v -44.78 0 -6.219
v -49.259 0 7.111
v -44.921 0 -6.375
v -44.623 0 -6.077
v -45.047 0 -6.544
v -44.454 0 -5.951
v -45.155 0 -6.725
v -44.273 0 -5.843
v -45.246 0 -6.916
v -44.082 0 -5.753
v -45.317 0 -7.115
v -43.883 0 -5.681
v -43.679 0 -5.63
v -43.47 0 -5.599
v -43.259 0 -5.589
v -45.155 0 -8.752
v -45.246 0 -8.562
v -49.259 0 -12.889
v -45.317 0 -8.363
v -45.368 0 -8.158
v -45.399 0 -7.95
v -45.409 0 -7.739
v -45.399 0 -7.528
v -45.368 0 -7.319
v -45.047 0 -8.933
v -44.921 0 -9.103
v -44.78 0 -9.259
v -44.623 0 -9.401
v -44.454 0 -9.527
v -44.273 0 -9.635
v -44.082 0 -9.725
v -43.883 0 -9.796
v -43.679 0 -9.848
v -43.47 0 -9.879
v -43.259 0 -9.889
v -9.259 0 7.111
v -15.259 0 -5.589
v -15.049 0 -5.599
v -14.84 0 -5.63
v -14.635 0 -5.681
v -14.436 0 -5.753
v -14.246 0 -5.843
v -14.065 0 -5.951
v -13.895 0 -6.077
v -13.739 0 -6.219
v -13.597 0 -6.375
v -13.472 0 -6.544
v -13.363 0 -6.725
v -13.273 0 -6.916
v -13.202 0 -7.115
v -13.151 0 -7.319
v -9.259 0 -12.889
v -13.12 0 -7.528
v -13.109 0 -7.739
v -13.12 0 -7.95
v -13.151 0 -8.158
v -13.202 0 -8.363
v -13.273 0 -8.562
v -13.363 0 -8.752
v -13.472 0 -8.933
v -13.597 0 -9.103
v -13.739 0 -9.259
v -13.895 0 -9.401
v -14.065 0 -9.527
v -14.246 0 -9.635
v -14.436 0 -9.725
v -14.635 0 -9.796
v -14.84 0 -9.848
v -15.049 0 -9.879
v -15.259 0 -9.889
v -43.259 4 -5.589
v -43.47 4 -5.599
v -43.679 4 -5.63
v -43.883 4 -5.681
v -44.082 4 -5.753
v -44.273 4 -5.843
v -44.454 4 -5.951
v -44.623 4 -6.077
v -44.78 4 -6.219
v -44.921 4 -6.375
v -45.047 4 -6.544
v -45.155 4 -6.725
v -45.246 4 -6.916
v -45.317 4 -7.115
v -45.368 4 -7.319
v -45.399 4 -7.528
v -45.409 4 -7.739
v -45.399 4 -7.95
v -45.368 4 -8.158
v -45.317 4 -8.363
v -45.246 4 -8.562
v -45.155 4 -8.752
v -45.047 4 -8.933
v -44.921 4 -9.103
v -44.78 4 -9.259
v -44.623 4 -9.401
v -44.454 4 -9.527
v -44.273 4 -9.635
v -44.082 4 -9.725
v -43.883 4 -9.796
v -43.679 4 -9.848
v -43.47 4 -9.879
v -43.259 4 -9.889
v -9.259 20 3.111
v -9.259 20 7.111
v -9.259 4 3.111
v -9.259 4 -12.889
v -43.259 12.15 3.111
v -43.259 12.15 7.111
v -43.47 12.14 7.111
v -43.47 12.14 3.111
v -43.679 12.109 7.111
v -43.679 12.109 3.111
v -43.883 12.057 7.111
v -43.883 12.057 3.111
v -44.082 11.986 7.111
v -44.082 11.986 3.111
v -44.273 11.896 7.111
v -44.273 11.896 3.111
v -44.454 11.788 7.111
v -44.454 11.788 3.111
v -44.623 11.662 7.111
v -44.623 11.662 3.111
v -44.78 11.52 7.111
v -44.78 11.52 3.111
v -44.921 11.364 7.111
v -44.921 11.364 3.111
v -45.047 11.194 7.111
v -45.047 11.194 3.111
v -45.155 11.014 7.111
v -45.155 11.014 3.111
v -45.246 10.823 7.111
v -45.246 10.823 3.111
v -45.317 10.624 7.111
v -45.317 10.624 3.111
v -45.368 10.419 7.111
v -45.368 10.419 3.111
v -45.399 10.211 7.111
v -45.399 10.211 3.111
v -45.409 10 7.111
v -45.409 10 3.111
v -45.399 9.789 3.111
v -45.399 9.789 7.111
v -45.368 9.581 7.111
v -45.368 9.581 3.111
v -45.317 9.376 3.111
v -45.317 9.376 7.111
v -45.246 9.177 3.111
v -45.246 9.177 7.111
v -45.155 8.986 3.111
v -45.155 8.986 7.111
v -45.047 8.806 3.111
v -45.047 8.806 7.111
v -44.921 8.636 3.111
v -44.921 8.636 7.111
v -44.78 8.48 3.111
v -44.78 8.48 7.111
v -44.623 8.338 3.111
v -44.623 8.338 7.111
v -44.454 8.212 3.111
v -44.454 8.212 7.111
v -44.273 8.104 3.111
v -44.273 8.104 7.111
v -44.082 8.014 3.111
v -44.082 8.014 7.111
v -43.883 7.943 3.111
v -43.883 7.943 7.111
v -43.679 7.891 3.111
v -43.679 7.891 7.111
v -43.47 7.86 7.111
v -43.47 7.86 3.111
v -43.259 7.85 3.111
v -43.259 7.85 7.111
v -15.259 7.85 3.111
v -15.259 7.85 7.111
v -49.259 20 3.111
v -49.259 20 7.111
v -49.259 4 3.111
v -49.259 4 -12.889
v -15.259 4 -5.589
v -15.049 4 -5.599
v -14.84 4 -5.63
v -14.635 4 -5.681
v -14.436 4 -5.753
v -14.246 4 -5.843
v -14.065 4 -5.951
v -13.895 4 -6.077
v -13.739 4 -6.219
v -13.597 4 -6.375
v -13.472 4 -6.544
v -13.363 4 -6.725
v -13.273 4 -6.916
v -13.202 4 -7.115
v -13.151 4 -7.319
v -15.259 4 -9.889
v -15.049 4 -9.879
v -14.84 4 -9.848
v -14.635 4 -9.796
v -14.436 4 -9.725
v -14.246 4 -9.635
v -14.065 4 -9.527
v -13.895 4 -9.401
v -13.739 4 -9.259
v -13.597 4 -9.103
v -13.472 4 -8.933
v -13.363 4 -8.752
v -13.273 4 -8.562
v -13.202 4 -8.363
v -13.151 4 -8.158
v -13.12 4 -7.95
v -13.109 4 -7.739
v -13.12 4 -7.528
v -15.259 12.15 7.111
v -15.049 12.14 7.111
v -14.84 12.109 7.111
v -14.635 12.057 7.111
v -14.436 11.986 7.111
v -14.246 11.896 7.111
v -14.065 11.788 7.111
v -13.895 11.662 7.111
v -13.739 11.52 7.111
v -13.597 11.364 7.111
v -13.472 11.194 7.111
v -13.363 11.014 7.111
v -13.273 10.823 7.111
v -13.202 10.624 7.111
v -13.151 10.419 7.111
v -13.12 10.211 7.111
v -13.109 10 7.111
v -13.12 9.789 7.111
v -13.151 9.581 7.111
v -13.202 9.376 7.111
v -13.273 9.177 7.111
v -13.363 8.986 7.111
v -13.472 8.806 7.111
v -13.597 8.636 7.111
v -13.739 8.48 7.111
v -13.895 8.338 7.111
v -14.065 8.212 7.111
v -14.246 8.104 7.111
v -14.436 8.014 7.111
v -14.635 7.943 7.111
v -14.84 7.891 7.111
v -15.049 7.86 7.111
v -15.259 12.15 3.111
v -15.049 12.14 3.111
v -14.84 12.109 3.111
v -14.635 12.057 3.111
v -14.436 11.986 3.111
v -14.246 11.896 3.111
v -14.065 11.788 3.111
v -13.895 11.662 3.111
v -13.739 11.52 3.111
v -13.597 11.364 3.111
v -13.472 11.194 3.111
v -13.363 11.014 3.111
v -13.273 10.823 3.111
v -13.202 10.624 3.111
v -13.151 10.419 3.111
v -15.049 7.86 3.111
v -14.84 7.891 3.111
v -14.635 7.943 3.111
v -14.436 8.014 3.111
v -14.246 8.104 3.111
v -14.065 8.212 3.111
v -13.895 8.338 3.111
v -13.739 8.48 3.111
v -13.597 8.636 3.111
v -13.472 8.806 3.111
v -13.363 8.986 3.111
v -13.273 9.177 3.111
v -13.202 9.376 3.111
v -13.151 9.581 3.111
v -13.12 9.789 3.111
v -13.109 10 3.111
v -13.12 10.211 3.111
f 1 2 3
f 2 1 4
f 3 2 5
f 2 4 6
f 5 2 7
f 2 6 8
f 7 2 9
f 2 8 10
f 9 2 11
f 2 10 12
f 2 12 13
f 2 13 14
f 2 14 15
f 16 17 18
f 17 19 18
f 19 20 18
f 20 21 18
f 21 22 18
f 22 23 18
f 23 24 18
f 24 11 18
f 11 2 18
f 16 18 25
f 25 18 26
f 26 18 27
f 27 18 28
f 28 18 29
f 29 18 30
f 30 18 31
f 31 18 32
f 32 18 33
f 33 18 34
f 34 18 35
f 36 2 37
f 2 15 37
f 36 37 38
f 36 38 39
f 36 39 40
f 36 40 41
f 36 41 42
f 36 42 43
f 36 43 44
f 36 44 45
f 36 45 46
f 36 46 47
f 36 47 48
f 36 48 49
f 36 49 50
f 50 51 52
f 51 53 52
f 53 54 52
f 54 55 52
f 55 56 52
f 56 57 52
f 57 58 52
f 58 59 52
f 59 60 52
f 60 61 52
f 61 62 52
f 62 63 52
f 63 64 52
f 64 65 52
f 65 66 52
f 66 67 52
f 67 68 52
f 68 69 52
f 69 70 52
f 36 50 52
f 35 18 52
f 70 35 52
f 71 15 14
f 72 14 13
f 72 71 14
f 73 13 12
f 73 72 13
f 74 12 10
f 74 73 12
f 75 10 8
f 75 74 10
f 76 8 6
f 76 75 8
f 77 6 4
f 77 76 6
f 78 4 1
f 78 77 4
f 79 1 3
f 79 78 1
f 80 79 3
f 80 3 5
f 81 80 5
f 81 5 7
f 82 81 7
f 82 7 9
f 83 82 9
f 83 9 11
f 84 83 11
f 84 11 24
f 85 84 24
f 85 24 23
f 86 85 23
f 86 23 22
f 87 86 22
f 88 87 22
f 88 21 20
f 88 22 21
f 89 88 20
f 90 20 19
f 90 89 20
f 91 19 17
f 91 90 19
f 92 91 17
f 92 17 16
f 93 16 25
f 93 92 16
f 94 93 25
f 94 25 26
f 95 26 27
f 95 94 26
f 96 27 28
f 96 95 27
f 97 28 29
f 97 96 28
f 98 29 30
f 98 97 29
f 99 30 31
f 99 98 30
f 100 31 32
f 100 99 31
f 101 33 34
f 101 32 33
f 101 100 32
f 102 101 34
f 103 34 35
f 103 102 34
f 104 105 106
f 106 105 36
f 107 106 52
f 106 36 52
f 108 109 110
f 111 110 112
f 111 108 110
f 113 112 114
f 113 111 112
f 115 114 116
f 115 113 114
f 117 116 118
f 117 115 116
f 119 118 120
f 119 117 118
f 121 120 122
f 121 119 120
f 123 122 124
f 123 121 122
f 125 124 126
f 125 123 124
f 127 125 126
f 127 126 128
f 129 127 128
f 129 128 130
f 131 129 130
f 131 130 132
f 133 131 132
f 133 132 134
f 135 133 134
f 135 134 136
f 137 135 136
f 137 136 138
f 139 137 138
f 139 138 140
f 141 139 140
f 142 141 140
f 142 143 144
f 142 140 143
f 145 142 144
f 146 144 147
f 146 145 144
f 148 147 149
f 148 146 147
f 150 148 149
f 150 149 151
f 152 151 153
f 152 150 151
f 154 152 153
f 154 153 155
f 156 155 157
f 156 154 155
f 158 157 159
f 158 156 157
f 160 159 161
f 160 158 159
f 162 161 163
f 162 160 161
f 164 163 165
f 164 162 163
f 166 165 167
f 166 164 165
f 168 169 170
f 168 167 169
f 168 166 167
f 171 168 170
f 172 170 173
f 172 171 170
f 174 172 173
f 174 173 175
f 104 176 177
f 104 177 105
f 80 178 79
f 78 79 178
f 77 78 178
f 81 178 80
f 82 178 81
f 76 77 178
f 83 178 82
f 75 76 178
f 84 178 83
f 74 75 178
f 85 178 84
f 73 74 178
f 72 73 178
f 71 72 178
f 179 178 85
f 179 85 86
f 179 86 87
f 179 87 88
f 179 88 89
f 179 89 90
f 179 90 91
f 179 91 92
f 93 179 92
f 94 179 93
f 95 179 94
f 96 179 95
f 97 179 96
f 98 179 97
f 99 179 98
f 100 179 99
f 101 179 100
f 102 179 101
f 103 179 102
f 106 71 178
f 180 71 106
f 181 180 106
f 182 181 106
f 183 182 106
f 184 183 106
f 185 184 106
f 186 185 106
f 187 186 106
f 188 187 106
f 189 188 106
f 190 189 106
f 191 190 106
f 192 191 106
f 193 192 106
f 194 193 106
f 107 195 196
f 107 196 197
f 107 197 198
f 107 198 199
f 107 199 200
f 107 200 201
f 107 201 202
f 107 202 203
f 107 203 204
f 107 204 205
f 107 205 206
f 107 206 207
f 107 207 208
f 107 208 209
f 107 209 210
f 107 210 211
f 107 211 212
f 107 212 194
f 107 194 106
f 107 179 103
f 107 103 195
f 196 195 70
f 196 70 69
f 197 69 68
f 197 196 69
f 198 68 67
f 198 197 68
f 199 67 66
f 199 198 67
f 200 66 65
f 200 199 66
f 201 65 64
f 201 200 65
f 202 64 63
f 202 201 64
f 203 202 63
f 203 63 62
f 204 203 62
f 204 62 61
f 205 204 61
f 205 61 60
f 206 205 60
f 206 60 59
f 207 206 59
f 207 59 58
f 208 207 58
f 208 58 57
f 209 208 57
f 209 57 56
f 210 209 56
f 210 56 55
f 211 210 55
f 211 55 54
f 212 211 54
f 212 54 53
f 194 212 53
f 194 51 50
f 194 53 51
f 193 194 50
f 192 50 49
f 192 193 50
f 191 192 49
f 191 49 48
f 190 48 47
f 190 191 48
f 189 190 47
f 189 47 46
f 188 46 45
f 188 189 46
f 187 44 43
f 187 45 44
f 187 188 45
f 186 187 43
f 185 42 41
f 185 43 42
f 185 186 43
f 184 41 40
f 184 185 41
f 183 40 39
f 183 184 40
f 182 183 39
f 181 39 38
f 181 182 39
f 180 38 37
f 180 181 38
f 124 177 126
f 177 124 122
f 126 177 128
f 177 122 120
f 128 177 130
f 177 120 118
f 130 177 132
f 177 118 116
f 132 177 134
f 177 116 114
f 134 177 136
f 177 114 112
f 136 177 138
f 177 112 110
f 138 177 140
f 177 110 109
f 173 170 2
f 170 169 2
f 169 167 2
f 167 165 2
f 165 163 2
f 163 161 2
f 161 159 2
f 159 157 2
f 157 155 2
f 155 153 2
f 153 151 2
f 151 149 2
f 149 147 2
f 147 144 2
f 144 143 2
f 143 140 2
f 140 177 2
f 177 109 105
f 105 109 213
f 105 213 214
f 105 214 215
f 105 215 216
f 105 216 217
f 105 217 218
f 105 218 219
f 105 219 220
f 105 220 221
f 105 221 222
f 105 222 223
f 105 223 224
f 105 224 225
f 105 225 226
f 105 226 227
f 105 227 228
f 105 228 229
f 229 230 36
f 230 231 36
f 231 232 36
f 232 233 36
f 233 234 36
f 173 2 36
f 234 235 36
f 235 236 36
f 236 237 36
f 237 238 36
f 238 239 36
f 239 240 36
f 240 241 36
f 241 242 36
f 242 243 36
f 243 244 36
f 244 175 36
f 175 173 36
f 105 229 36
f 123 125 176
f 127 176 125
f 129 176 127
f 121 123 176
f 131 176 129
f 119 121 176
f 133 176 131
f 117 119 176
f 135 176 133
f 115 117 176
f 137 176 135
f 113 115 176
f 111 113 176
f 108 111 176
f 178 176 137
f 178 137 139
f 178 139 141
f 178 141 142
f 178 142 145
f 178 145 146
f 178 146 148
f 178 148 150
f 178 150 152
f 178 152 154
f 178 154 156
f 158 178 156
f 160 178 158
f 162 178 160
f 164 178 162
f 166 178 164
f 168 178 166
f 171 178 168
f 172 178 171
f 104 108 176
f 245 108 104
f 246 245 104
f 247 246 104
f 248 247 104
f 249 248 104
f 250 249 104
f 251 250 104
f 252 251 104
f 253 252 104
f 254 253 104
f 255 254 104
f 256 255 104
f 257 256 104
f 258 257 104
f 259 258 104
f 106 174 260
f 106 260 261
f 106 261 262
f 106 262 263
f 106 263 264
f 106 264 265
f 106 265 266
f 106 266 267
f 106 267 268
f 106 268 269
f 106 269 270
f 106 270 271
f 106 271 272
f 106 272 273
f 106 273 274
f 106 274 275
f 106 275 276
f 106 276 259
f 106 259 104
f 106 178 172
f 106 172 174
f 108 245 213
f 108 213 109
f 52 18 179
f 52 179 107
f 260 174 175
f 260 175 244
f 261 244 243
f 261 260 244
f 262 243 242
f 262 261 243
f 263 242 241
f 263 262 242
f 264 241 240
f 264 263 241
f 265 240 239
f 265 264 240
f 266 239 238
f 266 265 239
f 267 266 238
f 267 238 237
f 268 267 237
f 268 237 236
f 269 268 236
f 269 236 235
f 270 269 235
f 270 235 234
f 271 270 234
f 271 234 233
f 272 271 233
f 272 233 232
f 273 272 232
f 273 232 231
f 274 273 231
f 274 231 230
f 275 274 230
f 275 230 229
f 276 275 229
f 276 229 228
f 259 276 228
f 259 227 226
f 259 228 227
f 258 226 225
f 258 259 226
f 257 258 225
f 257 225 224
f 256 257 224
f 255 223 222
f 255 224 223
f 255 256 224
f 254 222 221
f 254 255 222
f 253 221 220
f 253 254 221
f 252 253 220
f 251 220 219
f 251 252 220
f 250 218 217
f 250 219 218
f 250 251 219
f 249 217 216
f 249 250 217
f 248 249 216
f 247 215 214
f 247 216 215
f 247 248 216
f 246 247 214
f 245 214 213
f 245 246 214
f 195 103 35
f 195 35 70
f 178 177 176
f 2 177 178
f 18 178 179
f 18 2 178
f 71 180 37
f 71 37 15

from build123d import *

# Parameters (mm, degrees)
SKETCH1_W           = 40
SKETCH1_H           = 20
BOSS_EXTRUDE1_DEPTH = 4
SKETCH5_W           = 40
SKETCH5_H           = 4
BOSS_EXTRUDE2_DEPTH = 16
CUT_EXTRUDE3_DEPTH  = 10
CUT_EXTRUDE5_DEPTH  = 10


with BuildPart() as part:
    # Sketch1 → Boss-Extrude1 (new body)
    with BuildSketch(Plane(origin=(0, 0, 0), x_dir=(1, 0, 0), z_dir=(0, 1, 0))):
        with Locations((-29.259259259, 2.888888889)):
            Rectangle(SKETCH1_W, SKETCH1_H)
    extrude(amount=BOSS_EXTRUDE1_DEPTH)

    # Sketch5 → Boss-Extrude2 (add)
    with BuildSketch(Plane(origin=(0, 4, 0), x_dir=(1, 0, 0), z_dir=(0, 1, 0))):
        with Locations((-29.259259259, -5.111111111)):
            Rectangle(SKETCH5_W, SKETCH5_H)
    extrude(amount=BOSS_EXTRUDE2_DEPTH)

    # Sketch7 → Cut-Extrude3 (cut)
    with BuildSketch(Plane(origin=(0, 4, 0), x_dir=(1, 0, 0), z_dir=(0, 1, 0))):
        with BuildLine():
            Line((-15.259259259, 5.588888889), (-43.259259259, 5.588888889))
            ThreePointArc((-43.259259259, 5.588888889), (-45.409259259, 7.738888889), (-43.259259259, 9.888888889))
            Line((-43.259259259, 9.888888889), (-15.259259259, 9.888888889))
            ThreePointArc((-15.259259259, 9.888888889), (-13.109259259, 7.738888889), (-15.259259259, 5.588888889))
        make_face()
    extrude(amount=-CUT_EXTRUDE3_DEPTH, mode=Mode.SUBTRACT)

    # Sketch8 → Cut-Extrude5 (cut)
    with BuildSketch(Plane(origin=(0, 0, 3.111111111), x_dir=(-1, 0, 0), z_dir=(0, 0, -1))):
        with BuildLine():
            Line((15.259259259, 12.15), (43.259259259, 12.15))
            ThreePointArc((43.259259259, 12.15), (45.409259259, 10), (43.259259259, 7.85))
            Line((43.259259259, 7.85), (15.259259259, 7.85))
            ThreePointArc((15.259259259, 7.85), (13.109259259, 10), (15.259259259, 12.15))
        make_face()
    extrude(amount=-CUT_EXTRUDE5_DEPTH, mode=Mode.SUBTRACT)


solid = part.part
